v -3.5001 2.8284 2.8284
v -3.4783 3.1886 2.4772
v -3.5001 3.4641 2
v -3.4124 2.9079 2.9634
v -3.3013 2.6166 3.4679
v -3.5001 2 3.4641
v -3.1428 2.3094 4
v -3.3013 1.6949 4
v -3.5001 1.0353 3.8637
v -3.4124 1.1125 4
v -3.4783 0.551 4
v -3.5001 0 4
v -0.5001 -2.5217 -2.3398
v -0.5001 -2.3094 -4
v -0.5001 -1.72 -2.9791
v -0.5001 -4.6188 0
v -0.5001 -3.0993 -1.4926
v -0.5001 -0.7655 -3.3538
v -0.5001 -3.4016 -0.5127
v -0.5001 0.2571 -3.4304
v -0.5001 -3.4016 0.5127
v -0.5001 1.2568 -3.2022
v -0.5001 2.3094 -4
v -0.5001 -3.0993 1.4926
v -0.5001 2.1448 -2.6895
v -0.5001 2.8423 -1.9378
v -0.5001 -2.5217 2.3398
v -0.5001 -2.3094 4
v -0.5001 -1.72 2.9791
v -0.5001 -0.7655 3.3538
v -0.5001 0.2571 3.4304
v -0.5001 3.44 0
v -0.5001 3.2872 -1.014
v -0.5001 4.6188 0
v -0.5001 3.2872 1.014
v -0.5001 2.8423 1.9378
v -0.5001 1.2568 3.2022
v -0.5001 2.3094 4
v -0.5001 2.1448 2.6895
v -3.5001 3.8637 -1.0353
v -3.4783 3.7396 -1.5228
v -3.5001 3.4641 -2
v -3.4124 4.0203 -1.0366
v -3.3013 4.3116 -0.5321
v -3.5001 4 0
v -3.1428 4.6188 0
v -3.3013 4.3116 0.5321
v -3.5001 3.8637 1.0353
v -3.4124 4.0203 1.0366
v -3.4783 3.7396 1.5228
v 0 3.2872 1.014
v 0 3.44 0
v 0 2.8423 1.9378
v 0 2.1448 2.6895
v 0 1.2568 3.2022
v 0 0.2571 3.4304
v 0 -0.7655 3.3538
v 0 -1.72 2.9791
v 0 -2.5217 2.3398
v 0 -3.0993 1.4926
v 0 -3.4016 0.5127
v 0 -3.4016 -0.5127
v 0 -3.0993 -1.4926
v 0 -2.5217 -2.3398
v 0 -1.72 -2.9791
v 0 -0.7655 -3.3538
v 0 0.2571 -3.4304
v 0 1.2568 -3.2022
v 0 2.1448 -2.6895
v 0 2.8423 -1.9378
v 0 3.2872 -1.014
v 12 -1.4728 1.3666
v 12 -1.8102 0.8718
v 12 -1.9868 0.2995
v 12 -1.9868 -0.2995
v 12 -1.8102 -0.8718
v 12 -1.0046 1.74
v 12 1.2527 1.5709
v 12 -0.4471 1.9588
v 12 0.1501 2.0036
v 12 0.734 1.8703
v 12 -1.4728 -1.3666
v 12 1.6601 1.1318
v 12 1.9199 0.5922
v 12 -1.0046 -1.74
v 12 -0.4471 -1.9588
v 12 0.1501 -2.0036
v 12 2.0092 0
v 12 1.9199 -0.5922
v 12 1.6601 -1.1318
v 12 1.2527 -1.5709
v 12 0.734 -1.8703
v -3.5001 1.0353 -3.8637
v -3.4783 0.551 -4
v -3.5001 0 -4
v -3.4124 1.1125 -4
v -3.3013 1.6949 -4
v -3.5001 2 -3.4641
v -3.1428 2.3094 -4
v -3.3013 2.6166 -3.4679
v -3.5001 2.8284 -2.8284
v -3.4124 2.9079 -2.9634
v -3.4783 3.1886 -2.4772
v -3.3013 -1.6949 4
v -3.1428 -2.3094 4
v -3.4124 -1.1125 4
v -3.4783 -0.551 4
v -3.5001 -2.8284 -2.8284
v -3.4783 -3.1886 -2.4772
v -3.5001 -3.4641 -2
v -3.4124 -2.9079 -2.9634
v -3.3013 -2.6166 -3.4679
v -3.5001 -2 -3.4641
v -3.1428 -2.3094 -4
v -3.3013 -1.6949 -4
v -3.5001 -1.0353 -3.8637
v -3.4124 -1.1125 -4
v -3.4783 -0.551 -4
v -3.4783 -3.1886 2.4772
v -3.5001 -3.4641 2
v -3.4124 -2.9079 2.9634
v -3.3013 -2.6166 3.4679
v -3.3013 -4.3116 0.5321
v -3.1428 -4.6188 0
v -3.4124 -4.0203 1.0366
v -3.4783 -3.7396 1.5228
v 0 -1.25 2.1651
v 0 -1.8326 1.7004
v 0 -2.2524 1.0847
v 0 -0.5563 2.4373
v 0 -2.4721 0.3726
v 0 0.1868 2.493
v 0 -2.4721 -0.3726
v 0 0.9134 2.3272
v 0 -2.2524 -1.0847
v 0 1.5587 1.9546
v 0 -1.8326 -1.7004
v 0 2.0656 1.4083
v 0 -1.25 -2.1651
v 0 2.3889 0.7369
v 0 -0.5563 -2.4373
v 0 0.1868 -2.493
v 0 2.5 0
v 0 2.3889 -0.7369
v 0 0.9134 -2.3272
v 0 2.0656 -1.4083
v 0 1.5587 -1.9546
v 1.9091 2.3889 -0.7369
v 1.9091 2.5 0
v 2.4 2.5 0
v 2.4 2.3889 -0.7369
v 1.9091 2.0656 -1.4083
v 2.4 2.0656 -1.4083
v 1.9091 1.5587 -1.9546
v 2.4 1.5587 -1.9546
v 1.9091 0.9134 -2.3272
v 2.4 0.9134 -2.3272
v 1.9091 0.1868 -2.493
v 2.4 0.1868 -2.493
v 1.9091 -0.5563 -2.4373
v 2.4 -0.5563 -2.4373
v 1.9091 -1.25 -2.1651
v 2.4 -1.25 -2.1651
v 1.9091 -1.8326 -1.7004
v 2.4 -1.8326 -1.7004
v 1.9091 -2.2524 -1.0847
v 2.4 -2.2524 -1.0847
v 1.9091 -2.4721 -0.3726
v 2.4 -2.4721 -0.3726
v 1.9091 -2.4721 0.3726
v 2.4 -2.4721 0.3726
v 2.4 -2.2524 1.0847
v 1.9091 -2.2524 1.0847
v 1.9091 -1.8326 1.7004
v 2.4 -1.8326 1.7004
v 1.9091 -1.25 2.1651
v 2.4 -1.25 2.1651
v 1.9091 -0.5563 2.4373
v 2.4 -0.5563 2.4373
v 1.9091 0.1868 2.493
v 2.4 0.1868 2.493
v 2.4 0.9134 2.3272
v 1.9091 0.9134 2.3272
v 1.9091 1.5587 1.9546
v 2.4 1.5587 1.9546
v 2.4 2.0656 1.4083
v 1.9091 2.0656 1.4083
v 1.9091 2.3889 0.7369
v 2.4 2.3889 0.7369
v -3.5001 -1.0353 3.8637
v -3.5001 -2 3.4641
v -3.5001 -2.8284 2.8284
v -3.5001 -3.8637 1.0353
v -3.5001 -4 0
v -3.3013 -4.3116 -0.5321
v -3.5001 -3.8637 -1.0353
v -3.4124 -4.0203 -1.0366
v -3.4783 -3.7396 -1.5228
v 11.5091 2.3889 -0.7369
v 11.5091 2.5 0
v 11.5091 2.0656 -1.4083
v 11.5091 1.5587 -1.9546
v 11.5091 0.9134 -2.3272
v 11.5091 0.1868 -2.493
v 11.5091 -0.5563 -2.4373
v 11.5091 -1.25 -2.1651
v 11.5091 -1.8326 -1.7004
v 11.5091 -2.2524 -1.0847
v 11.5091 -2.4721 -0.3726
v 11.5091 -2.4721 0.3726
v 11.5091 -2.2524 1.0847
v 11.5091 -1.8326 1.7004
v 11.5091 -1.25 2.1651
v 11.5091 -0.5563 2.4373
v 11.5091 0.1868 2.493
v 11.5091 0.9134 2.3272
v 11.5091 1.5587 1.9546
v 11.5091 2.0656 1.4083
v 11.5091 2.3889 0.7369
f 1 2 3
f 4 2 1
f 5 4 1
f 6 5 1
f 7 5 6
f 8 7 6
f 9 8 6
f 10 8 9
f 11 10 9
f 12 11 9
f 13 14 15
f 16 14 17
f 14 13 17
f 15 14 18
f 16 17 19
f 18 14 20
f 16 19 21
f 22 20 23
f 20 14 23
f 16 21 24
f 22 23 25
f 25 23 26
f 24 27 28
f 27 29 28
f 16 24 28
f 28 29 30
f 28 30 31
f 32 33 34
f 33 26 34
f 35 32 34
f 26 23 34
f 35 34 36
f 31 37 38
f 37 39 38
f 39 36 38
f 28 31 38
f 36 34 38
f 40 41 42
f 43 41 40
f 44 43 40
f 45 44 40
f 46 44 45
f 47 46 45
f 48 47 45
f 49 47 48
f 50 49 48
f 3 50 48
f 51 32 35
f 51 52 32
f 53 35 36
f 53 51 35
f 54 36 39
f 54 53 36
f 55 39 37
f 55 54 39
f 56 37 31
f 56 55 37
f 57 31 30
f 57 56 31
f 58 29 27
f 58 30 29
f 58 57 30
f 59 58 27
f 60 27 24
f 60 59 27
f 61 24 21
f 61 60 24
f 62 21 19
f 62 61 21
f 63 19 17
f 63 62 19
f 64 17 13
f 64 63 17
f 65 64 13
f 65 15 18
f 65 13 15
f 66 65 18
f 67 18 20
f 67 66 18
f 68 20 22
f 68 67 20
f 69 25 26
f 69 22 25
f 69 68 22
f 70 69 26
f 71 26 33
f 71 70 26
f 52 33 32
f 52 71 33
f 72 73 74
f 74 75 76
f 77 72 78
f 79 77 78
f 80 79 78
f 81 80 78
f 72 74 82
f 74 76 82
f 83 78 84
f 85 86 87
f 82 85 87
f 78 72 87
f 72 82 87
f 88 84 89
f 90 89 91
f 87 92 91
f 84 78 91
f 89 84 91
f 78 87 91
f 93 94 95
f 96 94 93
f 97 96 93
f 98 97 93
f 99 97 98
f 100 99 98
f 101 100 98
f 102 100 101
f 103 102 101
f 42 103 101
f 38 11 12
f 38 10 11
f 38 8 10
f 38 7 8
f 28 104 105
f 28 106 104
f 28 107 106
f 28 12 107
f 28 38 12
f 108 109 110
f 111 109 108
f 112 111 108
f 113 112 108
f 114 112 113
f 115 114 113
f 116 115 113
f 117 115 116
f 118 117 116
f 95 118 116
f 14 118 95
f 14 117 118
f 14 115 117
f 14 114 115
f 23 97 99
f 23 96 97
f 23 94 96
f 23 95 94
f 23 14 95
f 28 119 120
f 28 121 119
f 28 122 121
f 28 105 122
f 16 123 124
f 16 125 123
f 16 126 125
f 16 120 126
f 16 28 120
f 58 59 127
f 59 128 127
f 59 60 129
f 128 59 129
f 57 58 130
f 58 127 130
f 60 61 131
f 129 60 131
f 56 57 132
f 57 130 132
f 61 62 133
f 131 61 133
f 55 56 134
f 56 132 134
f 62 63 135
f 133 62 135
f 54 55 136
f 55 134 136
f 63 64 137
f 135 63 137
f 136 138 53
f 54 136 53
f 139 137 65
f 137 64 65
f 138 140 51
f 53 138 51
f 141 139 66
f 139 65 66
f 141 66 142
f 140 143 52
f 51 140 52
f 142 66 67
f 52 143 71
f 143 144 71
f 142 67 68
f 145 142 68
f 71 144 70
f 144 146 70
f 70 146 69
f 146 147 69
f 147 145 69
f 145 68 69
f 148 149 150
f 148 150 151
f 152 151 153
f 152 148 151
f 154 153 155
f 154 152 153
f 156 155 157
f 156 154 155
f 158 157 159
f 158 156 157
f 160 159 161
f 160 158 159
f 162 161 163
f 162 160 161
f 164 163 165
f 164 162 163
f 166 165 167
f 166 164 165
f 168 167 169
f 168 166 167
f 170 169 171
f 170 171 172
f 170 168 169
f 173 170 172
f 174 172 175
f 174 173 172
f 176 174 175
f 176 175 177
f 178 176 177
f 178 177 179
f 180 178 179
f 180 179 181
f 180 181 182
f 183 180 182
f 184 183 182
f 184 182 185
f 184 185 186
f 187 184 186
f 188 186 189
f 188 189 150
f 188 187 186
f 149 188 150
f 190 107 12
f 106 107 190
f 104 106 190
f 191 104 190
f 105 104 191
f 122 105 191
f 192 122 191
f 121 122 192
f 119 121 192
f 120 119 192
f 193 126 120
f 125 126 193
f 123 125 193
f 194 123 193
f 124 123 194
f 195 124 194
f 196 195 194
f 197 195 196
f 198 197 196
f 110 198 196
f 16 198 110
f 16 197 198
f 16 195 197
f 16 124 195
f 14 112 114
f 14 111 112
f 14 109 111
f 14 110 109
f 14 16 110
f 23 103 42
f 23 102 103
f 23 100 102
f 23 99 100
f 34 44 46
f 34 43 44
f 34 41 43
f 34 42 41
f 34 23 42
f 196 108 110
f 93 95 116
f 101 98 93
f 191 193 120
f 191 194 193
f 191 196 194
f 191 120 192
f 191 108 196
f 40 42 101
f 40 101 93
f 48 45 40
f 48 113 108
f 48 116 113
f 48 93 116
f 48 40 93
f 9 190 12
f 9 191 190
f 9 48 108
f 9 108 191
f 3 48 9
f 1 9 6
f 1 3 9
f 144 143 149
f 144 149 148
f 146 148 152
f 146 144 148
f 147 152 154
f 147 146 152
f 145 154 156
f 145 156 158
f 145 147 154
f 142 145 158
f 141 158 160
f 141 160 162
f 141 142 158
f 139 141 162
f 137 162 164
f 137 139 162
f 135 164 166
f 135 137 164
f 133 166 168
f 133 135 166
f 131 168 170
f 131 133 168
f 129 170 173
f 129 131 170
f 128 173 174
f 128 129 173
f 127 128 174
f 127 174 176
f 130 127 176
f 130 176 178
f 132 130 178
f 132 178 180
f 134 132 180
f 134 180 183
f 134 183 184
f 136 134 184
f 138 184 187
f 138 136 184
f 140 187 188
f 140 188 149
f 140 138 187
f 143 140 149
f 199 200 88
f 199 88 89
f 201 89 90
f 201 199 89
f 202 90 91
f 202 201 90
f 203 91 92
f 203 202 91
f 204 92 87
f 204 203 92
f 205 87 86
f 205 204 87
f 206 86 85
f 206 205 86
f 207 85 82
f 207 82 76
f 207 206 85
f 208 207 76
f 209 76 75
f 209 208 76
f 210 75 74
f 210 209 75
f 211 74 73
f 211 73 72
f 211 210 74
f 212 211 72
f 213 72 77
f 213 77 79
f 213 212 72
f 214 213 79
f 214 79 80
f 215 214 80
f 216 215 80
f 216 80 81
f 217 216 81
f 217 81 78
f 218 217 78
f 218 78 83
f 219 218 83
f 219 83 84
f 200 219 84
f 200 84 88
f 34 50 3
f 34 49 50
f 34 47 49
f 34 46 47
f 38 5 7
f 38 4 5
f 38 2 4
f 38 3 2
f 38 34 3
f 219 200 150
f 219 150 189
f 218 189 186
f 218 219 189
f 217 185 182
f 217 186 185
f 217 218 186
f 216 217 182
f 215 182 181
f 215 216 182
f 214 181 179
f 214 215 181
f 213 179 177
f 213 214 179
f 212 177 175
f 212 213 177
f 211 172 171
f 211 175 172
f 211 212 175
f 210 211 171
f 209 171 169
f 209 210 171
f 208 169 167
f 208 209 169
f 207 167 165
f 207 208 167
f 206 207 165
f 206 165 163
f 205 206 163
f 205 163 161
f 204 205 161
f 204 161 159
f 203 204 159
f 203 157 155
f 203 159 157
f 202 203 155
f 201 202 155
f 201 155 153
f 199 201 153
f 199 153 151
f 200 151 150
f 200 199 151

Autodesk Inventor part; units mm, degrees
ref_plane "YZ Plane" through (0, 0, 0) normal (1, 0, 0) x (0, 1, 0)
ref_plane "XZ Plane" through (0, 0, 0) normal (0, 1, 0) x (-1, 0, 0)
sketch "Sketch1" plane through (0, 0, 0) normal (0, 0, 1) x (1, 0, 0)
  line L0 (0, 3.44) -> (0, 2.5)
  line L1 (2.4, 2.5) -> (12, 2.5)
  line L2 (12, 2.5) -> (12, 0)
  line L3 (12, 0) -> (-0.5001, 0)
  line L4 (-3.0001, 0) -> (14.5, 0) projected
  line L5 (-0.5001, 0) -> (-0.5001, 3.44)
  line L6 (-0.5001, 3.44) -> (0, 3.44)
  line L7 (2.4, 2.5) -> (1.9091, 2.5)
  line L8 (1.9091, 2.5) -> (0, 2.5)
  line L9 (0, -0.688) -> (0, 4.128) projected
  dimension "d0" = 12
  dimension "d1" = 9.6
  dimension "d2" = 5
  dimension "d9" = 0.5001
  dimension "d10" = 6.88
  dimension "d13" = 0.4909
  dimension "d14" = 5
revolve "Body" add sketch "Sketch1" angle 360 about axis through (12, 0, 0) along (-1, 0, 0)
sketch "Sketch2" plane through (-0.5001, 0, 0) normal (-1, 0, 0) x (0, 0, 1)
  line L0 (0, 4.6188) -> (4, 2.3094)
  line L1 (4, 2.3094) -> (4, -2.3094)
  line L2 (4, -2.3094) -> (0, -4.6188)
  line L3 (0, -4.6188) -> (-4, -2.3094)
  line L4 (-4, -2.3094) -> (-4, 2.3094)
  line L5 (-4, 2.3094) -> (0, 4.6188)
  point P0 (0, 0)
  point P1 (0, 0)
  dimension "d11" = 8
extrude "Head" add sketch "Sketch2" along normal blind 3
sketch "Sketch4" plane through (0, 0, 0) normal (0, 0, 1) x (1, 0, 0)
  line L0 (-3.5001, 4) -> (-3.5001, 4.6188)
  line L1 (-3.5001, 4.6188) -> (-3.1428, 4.6188)
  line L2 (-3.1428, 4.6188) -> (-3.5001, 4)
  line L3 (-4.1001, 0) -> (0.0999, 0) projected
  line L4 (-0.5001, 4.6188) -> (-3.5001, 4.6188) projected
  line L5 (-3.5001, 2.3094) -> (-3.5001, 4.6188) projected
  dimension "d5" = 30
  dimension "d19" = 8
revolve "Chamfer1" cut sketch "Sketch4" angle 360 about axis through (-10, 0, 0) along (1, 0, 0)
thread "Thread" size "M5x0.8" class "6g" standard "ISO Metric profile" length 9.6
chamfer "Chamfer2" distance 0.4908 distance2 0.4909 1 edges at (12, -2.5, 0) measured on face at (12, -0.7379, 0.3873)
ref_plane "Work Plane1" through (1.525, 0, 0) normal (0, 0, 1) x (1, 0, 0)
equation "\"d0\" = NLG"
equation "\"d1\" = GEL"
equation "\"d2\" = GD"
equation "\"d10\" = SD2"
equation "\"d14\" = BDM"
equation "\"d11\" = SW"
equation "\"d3\" = KOH - SD"
equation "\"d5\" = ANG1"
equation "\"d19\" = SW0"
equation "\"d15\" = GEL"
equation "\"d6\" = -0.5 * SPD + 0.5 * GD"
equation "\"NLG\" = 12"
equation "\"GD\" = NND"
equation "\"BDM\" = NND"
equation "\"KOH\" = 3.5"
equation "\"GEL\" = 9.6"
equation "\"SW\" = 8"
equation "\"SW0\" = SW"
equation "\"SPD\" = NND - 1.2269 * PTC"
equation "\"SD2\" = 6.88"
equation "\"SD\" = 0.5"
equation "\"ANG1\" = 30deg"
equation "\"GAL\" = 0.61345 * PTC"
equation "\"GUL\" = 0.61345 * PTC"
equation "\"RR\" = 0.2"
equation "\"GD1\" = THREADDIA - 1.2269 * PTC"
equation "\"THREADDIA\" = 5"
equation "\"SDH\" = SD2"
equation "\"SDHG\" = 2.4"
equation "\"TOA\" = 30deg"
equation "\"PTC\" = 0.8"
equation "\"NND\" = 5"
equation "\"E0\" = 9.24"
properties part number "ISO 4017 - M5 x 12" material "Steel, Mild"
